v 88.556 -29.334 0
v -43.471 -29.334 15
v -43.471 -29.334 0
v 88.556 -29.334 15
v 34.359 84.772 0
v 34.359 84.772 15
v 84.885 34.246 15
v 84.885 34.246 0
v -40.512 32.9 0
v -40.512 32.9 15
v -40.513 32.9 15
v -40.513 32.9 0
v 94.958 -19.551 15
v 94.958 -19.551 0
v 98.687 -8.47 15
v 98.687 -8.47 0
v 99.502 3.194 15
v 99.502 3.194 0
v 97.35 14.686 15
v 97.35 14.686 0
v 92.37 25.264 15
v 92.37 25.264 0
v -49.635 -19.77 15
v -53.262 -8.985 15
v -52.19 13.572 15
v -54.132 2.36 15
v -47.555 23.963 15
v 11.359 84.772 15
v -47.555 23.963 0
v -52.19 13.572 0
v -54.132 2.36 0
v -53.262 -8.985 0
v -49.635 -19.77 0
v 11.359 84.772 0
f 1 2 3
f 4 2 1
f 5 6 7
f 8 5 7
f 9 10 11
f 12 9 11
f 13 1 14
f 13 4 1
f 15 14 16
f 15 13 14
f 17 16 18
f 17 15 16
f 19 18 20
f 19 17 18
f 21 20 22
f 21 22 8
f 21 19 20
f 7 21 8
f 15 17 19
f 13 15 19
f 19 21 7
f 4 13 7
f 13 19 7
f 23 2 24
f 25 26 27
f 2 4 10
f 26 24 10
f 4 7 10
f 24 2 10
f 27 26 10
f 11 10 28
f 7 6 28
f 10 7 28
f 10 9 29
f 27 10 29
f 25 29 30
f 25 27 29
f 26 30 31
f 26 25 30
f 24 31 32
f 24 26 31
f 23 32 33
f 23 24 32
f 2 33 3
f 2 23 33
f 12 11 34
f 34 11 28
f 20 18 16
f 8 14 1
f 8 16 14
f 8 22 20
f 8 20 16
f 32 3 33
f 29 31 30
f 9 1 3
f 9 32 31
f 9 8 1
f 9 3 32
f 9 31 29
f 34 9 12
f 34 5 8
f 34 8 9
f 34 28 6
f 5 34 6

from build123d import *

# Parameters (mm, degrees)
EXTRUSION008_DEPTH = 15
RECTANGLE001_W     = 146.971653
RECTANGLE001_H     = 26.042151
EXTRUSION007_DEPTH = 15
CIRCLE002_R        = 46
EXTRUSION005_DEPTH = 15
CIRCLE003_R        = 46
EXTRUSION006_DEPTH = 15


with BuildPart() as extrusion008:
    # Wire001 → Extrusion008 (new body)
    with BuildSketch(Plane(origin=(-40.513268, 32.899851, 15), x_dir=(1, 0, 0), z_dir=(0, 0, 1))):
        Polygon((0, 0), (51.871842, 51.871844), (74.871842, 51.871844), (126.743685, 1e-06), align=None)
    extrude(amount=-EXTRUSION008_DEPTH)


with BuildPart() as extrusion007:
    # Rectangle001 → Extrusion007 (new body)
    with BuildSketch(Plane(origin=(-43.712536, -55.376318, 15), x_dir=(1, 0, 0), z_dir=(0, 0, 1))):
        with Locations((73.485827, 13.021076)):
            Rectangle(RECTANGLE001_W, RECTANGLE001_H)
    extrude(amount=-EXTRUSION007_DEPTH)


with BuildPart() as extrusion005:
    # Circle002 → Extrusion005 (new body)
    with BuildSketch(Plane(origin=(53.57846, 0.542169, 15), x_dir=(1, 0, 0), z_dir=(0, 0, 1))):
        Circle(CIRCLE002_R)
    extrude(amount=-EXTRUSION005_DEPTH)


with BuildPart() as fusion001002003:
    # Circle003 → Extrusion006 (new body)
    with BuildSketch(Plane(origin=(-8.183821, 0.175382, 15), x_dir=(1, 0, 0), z_dir=(0, 0, 1))):
        Circle(CIRCLE003_R)
    extrude(amount=-EXTRUSION006_DEPTH)

    # Fusion001002002: union Extrusion005
    add(extrusion005.part)

    # Cut: cut Extrusion007
    add(extrusion007.part, mode=Mode.SUBTRACT)

    # Fusion001002003: union Extrusion008
    add(extrusion008.part)


solid = fusion001002003.part
